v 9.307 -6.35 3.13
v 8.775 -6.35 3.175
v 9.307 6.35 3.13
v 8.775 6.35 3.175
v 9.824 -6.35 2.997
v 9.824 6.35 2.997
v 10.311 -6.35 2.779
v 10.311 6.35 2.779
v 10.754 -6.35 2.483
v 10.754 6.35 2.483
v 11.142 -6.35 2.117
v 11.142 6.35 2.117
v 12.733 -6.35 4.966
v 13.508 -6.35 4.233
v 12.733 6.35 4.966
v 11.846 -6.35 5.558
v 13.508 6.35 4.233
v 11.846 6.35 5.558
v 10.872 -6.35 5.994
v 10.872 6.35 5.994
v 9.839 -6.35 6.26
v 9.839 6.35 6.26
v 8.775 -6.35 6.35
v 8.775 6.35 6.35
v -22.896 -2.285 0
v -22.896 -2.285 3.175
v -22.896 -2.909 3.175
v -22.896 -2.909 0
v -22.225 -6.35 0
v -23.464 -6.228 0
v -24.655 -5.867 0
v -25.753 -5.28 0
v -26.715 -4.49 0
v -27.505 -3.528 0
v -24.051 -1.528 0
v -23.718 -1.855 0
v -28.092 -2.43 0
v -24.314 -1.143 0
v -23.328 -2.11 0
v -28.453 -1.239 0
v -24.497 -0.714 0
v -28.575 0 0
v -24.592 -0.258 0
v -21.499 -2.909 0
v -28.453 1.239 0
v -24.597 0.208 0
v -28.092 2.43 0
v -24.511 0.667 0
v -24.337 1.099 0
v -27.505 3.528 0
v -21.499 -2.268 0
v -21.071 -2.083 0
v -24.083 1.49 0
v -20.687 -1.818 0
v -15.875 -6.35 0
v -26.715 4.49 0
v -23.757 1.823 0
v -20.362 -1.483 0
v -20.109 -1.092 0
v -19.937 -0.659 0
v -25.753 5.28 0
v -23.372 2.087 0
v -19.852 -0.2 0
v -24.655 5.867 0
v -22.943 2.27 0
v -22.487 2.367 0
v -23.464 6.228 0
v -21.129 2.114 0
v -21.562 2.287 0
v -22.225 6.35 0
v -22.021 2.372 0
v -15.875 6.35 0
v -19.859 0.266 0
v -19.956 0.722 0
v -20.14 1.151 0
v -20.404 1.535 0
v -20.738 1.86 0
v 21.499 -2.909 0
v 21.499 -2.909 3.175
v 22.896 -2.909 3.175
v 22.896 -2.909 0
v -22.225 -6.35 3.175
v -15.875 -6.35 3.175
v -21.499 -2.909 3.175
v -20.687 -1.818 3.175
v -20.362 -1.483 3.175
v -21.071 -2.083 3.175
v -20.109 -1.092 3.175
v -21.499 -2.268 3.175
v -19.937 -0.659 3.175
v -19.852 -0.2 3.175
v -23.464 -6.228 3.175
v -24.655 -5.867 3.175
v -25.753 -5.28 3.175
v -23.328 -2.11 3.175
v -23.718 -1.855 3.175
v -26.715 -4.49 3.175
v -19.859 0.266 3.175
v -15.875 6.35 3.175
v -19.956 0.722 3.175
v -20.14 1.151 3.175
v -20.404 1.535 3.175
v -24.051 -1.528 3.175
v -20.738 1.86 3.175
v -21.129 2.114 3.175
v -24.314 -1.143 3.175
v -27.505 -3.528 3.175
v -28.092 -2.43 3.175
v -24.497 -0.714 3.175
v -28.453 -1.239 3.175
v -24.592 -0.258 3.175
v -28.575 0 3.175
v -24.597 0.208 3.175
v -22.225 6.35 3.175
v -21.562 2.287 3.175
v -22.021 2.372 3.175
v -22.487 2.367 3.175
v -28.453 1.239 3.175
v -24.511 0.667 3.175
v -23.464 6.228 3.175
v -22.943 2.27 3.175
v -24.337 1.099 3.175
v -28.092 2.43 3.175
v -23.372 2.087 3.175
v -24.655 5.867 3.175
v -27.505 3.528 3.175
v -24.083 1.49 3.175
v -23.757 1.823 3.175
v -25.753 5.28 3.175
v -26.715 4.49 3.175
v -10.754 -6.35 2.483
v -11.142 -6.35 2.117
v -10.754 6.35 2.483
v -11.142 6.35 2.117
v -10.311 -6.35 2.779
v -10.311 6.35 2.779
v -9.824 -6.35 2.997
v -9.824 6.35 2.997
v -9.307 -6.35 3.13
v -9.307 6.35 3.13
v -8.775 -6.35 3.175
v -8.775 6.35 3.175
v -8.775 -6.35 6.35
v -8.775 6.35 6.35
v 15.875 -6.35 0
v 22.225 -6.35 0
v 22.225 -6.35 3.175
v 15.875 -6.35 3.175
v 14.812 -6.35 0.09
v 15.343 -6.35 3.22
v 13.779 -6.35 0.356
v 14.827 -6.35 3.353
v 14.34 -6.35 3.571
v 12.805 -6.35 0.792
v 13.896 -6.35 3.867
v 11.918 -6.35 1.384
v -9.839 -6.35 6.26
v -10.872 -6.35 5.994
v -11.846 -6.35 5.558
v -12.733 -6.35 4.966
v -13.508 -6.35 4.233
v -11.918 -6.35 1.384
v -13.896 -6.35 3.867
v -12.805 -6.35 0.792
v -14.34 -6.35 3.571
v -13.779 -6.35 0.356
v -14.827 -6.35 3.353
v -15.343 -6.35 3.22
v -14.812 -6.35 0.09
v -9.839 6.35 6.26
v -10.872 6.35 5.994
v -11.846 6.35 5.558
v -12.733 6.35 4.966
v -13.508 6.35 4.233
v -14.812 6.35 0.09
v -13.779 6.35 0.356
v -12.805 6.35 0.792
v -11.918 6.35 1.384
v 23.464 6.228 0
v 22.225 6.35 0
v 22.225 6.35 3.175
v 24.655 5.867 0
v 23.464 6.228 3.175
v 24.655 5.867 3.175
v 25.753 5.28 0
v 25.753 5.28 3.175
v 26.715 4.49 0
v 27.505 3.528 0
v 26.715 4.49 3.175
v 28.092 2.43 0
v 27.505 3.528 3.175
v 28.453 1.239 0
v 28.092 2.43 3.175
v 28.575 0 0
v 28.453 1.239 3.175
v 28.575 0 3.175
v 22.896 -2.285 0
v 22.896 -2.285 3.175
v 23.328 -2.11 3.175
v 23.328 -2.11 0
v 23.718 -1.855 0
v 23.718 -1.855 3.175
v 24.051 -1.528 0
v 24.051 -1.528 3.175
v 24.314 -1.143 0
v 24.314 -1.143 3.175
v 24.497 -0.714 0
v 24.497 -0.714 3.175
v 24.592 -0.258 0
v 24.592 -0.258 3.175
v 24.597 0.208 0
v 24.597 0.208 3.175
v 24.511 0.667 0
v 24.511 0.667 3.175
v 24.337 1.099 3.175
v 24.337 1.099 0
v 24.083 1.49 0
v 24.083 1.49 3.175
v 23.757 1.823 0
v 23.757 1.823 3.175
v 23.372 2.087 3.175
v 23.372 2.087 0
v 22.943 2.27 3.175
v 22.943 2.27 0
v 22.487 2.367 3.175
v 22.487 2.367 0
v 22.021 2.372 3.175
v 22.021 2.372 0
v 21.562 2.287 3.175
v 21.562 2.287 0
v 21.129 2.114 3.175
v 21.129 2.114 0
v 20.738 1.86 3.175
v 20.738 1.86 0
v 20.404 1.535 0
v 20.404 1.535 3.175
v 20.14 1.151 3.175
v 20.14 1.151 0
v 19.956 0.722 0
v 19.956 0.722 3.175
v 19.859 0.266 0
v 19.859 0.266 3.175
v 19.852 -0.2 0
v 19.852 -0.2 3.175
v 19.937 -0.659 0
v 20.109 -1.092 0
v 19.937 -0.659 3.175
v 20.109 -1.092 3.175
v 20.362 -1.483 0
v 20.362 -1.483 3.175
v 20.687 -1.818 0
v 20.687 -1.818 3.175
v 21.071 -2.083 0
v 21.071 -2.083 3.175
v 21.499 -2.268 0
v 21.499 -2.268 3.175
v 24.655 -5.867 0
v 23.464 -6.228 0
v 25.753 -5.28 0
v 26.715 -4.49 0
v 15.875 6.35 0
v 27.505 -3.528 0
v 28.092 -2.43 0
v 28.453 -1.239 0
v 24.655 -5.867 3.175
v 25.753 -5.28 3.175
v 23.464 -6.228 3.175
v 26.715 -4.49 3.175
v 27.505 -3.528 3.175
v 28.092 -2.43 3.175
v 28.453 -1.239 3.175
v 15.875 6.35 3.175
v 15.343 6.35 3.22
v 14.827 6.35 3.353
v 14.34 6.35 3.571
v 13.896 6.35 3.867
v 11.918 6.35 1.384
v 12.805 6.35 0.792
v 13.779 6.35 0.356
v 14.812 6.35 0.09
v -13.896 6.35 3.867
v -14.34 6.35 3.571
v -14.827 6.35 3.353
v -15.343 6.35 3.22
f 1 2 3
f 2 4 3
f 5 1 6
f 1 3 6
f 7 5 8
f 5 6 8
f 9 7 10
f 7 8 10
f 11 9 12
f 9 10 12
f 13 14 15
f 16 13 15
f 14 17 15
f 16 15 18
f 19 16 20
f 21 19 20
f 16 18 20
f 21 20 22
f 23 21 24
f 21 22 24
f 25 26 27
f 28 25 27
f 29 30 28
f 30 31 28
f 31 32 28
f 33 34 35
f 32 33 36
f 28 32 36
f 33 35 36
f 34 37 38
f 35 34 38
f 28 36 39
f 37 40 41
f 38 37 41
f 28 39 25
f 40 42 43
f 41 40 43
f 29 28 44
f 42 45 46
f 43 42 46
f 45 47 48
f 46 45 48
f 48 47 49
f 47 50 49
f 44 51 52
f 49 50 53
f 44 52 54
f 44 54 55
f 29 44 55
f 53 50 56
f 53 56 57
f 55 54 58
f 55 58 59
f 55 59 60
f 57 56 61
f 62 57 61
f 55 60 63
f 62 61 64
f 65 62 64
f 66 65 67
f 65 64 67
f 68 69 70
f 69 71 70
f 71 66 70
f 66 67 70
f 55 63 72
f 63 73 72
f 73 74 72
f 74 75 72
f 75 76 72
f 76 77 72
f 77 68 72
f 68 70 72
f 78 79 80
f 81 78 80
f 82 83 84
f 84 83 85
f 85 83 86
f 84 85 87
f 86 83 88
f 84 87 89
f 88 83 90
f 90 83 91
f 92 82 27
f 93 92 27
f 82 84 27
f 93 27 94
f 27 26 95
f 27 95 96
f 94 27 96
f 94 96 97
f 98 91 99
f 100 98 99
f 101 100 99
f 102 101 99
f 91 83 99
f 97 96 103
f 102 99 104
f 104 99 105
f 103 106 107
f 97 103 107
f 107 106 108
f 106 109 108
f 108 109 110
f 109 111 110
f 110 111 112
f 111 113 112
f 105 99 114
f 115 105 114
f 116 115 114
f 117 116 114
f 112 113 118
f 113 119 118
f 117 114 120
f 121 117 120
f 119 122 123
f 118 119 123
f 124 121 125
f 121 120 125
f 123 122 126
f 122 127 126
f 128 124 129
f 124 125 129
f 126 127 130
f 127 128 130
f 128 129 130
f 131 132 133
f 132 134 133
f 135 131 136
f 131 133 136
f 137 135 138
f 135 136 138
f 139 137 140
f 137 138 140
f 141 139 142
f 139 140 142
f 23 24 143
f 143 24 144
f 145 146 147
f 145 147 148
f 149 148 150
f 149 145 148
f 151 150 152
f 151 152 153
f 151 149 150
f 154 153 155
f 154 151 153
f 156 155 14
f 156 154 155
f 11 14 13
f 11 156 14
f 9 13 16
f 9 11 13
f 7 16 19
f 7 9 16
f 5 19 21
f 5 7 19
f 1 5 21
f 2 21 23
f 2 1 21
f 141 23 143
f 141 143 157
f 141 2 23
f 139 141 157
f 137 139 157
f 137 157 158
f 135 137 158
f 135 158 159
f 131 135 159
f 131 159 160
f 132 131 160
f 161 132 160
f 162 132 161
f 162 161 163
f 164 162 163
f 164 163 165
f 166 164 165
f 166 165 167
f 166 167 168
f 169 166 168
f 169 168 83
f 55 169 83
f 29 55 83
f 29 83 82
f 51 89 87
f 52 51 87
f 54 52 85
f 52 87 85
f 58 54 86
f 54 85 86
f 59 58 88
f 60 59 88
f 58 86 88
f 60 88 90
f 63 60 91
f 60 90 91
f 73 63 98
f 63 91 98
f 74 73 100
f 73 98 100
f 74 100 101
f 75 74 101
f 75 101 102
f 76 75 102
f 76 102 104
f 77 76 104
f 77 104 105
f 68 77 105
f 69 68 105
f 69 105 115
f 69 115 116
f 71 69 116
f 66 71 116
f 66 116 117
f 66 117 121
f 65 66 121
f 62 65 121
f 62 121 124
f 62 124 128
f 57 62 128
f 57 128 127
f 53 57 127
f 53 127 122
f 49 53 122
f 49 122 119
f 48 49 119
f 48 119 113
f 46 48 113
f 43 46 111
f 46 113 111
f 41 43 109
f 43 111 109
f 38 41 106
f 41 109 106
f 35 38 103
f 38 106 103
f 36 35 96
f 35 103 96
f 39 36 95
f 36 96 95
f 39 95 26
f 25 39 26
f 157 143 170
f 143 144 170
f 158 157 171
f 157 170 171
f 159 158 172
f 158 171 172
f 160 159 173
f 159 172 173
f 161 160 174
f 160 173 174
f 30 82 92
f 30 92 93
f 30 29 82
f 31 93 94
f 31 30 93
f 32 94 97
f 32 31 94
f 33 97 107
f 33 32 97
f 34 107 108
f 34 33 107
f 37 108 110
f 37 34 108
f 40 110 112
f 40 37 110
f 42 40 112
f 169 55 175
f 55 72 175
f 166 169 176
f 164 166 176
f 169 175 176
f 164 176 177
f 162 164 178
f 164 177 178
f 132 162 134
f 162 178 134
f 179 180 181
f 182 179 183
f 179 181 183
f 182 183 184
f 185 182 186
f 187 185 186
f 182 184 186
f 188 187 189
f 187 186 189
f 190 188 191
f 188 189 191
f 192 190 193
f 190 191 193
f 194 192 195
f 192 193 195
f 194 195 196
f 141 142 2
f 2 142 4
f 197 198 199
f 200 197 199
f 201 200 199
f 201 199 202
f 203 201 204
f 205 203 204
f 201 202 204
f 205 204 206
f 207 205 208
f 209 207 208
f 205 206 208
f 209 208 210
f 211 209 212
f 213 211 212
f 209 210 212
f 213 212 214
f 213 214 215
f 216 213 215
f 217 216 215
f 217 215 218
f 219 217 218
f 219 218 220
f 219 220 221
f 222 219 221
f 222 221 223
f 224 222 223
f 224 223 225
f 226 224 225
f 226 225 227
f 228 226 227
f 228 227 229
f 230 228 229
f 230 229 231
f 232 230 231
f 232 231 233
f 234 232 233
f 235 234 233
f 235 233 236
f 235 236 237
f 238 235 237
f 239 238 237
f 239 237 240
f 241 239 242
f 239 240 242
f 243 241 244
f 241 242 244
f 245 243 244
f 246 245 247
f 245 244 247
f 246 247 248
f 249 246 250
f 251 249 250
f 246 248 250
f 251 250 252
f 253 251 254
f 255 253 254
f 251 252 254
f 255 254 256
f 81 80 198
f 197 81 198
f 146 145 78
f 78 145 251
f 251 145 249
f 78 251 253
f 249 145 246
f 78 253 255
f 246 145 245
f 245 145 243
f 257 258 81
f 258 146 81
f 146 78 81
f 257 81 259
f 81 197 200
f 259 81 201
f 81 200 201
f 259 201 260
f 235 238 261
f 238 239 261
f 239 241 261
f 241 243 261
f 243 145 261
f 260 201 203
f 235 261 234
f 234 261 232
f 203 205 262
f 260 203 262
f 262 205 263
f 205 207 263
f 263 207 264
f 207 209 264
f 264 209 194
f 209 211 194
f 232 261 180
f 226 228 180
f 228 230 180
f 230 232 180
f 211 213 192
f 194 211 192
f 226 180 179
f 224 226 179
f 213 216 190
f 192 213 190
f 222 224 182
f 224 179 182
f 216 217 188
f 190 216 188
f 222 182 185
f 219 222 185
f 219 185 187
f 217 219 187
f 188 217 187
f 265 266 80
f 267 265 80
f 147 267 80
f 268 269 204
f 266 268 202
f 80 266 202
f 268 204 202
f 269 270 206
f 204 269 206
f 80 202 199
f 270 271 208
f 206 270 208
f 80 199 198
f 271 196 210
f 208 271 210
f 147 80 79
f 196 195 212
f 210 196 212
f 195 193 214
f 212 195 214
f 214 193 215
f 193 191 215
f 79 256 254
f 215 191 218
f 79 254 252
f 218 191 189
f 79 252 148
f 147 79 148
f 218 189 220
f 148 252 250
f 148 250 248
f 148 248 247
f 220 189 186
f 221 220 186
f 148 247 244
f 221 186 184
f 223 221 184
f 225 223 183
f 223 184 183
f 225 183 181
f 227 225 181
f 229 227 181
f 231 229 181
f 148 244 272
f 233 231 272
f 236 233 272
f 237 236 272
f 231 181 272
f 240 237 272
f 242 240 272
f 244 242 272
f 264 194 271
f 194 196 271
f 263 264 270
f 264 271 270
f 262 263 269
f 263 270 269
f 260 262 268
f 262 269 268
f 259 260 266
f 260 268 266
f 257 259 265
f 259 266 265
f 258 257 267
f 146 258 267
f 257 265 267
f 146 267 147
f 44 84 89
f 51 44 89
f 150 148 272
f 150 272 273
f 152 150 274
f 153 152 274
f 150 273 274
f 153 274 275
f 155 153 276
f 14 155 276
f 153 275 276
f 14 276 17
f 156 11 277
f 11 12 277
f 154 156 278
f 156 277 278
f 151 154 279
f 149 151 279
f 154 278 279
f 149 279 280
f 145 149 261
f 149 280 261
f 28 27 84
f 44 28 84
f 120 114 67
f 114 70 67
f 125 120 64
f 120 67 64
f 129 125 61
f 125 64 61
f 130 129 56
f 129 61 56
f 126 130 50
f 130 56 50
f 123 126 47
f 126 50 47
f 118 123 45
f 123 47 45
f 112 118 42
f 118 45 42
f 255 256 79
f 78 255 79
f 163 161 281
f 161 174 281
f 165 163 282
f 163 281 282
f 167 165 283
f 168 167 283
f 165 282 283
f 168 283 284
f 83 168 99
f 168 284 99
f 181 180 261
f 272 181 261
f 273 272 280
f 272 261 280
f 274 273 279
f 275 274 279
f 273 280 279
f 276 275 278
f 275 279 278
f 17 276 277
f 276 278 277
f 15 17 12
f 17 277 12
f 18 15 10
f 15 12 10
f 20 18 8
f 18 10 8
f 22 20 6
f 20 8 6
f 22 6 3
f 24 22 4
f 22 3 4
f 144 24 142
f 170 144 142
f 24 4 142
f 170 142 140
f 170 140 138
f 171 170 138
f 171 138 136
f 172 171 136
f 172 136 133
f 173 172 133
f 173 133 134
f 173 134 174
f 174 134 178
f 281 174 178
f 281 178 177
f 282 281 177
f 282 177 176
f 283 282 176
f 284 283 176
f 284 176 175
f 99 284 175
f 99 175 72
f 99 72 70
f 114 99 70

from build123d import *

# Parameters (mm, degrees)
BASE_EXTRUDE_DEPTH = 6.35
FILLET1_R          = 6.35
CUT_EXTRUDE1_DEPTH = 30.443738723


with BuildPart() as part:
    # Sketch1 → Base-Extrude (new, symmetric)
    with BuildSketch(Plane(origin=(0, 0, 0), x_dir=(1, 0, 0), z_dir=(0, 1, 0))):
        with BuildLine():
            Line((-28.575, 0), (-15.875, 0))
            ThreePointArc((-15.875, 0), (-13.282623356, -0.5532696), (-11.141989448, -2.116666667))
            ThreePointArc((-11.141989448, -2.116666667), (-10.071672494, -2.8983652), (-8.775484171, -3.175))
            Line((-8.775484171, -3.175), (8.775484171, -3.175))
            ThreePointArc((8.775484171, -3.175), (10.071672494, -2.8983652), (11.141989448, -2.116666667))
            ThreePointArc((11.141989448, -2.116666667), (13.282623356, -0.5532696), (15.875, 0))
            Line((15.875, 0), (28.575, 0))
            Line((28.575, 0), (28.575, -3.175))
            Line((28.575, -3.175), (15.875, -3.175))
            ThreePointArc((15.875, -3.175), (14.578811678, -3.4516348), (13.508494724, -4.233333333))
            ThreePointArc((13.508494724, -4.233333333), (11.367860816, -5.7967304), (8.775484171, -6.35))
            Line((8.775484171, -6.35), (-8.775484171, -6.35))
            ThreePointArc((-8.775484171, -6.35), (-11.367860816, -5.7967304), (-13.508494724, -4.233333333))
            ThreePointArc((-13.508494724, -4.233333333), (-14.578811678, -3.4516348), (-15.875, -3.175))
            Line((-15.875, -3.175), (-28.575, -3.175))
            Line((-28.575, -3.175), (-28.575, 0))
        make_face()
    extrude(amount=BASE_EXTRUDE_DEPTH, both=True)

    # Fillet1
    fillet1_edges = [part.edges().sort_by_distance(p)[0] for p in [
        (-28.575, 6.35, 1.5875),
        (28.575, 6.35, 1.5875),
        (28.575, -6.35, 1.5875),
        (-28.575, -6.35, 1.5875),
    ]]
    fillet(fillet1_edges, radius=FILLET1_R - 0.0001)  # a hair under: the kernel refuses the full size

    # Sketch2 → Cut-Extrude1 (cut, through all)
    with BuildSketch(Plane.XY.offset(3.175)):
        with BuildLine():
            Line((-22.895630041, -2.284864747), (-22.895630041, -2.908854561))
            Line((-22.895630041, -2.908854561), (-21.498676538, -2.908854561))
            Line((-21.498676538, -2.908854561), (-21.498676538, -2.267775516))
            ThreePointArc((-21.498676538, -2.267775516), (-22.254128161, 2.381071841), (-22.895630041, -2.284864747))
        make_face()
        with BuildLine():
            Line((21.498676538, -2.267775516), (21.498676538, -2.908854561))
            Line((21.498676538, -2.908854561), (22.895630041, -2.908854561))
            Line((22.895630041, -2.908854561), (22.895630041, -2.284864747))
            ThreePointArc((22.895630041, -2.284864747), (22.254128161, 2.381071841), (21.498676538, -2.267775516))
        make_face()
    extrude(amount=-CUT_EXTRUDE1_DEPTH, mode=Mode.SUBTRACT)


solid = part.part
